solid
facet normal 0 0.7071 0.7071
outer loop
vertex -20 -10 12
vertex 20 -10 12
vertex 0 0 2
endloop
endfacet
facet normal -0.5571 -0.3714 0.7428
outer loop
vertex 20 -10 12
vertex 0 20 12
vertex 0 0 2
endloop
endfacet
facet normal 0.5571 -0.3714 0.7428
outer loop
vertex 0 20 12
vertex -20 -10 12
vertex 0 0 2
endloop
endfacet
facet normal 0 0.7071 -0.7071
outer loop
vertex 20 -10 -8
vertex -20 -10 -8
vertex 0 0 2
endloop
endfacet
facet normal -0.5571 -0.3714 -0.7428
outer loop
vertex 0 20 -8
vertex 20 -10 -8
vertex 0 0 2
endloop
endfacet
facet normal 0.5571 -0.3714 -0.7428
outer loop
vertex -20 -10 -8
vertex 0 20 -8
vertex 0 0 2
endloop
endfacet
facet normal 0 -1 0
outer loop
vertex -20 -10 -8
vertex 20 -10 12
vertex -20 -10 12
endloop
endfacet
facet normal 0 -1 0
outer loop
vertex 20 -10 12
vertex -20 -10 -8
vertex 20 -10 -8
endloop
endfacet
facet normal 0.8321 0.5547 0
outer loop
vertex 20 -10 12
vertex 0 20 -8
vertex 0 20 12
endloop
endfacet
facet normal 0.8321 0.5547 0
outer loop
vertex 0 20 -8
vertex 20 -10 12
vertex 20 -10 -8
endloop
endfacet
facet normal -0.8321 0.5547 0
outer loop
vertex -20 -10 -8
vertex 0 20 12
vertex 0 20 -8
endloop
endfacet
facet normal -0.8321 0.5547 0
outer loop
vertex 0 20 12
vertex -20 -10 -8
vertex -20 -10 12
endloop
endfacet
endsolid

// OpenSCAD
translate([0, 0, 2]) scale(10) polyhedron(
    points=[
        [ 0, 0,  0],

        [-2,-1, +1],
        [+2,-1, +1],
        [ 0,+2, +1],

        [-2,-1, -1],
        [+2,-1, -1],
        [ 0,+2, -1],
    ],
    faces=[
        [0, 2, 1],
        [0, 3, 2],
        [0, 1, 3],

        [0, 4, 5],
        [0, 5, 6],
        [0, 6, 4],

        [1, 2, 5, 4],
        [2, 3, 6, 5],
        [3, 1, 4, 6],
    ]
);
